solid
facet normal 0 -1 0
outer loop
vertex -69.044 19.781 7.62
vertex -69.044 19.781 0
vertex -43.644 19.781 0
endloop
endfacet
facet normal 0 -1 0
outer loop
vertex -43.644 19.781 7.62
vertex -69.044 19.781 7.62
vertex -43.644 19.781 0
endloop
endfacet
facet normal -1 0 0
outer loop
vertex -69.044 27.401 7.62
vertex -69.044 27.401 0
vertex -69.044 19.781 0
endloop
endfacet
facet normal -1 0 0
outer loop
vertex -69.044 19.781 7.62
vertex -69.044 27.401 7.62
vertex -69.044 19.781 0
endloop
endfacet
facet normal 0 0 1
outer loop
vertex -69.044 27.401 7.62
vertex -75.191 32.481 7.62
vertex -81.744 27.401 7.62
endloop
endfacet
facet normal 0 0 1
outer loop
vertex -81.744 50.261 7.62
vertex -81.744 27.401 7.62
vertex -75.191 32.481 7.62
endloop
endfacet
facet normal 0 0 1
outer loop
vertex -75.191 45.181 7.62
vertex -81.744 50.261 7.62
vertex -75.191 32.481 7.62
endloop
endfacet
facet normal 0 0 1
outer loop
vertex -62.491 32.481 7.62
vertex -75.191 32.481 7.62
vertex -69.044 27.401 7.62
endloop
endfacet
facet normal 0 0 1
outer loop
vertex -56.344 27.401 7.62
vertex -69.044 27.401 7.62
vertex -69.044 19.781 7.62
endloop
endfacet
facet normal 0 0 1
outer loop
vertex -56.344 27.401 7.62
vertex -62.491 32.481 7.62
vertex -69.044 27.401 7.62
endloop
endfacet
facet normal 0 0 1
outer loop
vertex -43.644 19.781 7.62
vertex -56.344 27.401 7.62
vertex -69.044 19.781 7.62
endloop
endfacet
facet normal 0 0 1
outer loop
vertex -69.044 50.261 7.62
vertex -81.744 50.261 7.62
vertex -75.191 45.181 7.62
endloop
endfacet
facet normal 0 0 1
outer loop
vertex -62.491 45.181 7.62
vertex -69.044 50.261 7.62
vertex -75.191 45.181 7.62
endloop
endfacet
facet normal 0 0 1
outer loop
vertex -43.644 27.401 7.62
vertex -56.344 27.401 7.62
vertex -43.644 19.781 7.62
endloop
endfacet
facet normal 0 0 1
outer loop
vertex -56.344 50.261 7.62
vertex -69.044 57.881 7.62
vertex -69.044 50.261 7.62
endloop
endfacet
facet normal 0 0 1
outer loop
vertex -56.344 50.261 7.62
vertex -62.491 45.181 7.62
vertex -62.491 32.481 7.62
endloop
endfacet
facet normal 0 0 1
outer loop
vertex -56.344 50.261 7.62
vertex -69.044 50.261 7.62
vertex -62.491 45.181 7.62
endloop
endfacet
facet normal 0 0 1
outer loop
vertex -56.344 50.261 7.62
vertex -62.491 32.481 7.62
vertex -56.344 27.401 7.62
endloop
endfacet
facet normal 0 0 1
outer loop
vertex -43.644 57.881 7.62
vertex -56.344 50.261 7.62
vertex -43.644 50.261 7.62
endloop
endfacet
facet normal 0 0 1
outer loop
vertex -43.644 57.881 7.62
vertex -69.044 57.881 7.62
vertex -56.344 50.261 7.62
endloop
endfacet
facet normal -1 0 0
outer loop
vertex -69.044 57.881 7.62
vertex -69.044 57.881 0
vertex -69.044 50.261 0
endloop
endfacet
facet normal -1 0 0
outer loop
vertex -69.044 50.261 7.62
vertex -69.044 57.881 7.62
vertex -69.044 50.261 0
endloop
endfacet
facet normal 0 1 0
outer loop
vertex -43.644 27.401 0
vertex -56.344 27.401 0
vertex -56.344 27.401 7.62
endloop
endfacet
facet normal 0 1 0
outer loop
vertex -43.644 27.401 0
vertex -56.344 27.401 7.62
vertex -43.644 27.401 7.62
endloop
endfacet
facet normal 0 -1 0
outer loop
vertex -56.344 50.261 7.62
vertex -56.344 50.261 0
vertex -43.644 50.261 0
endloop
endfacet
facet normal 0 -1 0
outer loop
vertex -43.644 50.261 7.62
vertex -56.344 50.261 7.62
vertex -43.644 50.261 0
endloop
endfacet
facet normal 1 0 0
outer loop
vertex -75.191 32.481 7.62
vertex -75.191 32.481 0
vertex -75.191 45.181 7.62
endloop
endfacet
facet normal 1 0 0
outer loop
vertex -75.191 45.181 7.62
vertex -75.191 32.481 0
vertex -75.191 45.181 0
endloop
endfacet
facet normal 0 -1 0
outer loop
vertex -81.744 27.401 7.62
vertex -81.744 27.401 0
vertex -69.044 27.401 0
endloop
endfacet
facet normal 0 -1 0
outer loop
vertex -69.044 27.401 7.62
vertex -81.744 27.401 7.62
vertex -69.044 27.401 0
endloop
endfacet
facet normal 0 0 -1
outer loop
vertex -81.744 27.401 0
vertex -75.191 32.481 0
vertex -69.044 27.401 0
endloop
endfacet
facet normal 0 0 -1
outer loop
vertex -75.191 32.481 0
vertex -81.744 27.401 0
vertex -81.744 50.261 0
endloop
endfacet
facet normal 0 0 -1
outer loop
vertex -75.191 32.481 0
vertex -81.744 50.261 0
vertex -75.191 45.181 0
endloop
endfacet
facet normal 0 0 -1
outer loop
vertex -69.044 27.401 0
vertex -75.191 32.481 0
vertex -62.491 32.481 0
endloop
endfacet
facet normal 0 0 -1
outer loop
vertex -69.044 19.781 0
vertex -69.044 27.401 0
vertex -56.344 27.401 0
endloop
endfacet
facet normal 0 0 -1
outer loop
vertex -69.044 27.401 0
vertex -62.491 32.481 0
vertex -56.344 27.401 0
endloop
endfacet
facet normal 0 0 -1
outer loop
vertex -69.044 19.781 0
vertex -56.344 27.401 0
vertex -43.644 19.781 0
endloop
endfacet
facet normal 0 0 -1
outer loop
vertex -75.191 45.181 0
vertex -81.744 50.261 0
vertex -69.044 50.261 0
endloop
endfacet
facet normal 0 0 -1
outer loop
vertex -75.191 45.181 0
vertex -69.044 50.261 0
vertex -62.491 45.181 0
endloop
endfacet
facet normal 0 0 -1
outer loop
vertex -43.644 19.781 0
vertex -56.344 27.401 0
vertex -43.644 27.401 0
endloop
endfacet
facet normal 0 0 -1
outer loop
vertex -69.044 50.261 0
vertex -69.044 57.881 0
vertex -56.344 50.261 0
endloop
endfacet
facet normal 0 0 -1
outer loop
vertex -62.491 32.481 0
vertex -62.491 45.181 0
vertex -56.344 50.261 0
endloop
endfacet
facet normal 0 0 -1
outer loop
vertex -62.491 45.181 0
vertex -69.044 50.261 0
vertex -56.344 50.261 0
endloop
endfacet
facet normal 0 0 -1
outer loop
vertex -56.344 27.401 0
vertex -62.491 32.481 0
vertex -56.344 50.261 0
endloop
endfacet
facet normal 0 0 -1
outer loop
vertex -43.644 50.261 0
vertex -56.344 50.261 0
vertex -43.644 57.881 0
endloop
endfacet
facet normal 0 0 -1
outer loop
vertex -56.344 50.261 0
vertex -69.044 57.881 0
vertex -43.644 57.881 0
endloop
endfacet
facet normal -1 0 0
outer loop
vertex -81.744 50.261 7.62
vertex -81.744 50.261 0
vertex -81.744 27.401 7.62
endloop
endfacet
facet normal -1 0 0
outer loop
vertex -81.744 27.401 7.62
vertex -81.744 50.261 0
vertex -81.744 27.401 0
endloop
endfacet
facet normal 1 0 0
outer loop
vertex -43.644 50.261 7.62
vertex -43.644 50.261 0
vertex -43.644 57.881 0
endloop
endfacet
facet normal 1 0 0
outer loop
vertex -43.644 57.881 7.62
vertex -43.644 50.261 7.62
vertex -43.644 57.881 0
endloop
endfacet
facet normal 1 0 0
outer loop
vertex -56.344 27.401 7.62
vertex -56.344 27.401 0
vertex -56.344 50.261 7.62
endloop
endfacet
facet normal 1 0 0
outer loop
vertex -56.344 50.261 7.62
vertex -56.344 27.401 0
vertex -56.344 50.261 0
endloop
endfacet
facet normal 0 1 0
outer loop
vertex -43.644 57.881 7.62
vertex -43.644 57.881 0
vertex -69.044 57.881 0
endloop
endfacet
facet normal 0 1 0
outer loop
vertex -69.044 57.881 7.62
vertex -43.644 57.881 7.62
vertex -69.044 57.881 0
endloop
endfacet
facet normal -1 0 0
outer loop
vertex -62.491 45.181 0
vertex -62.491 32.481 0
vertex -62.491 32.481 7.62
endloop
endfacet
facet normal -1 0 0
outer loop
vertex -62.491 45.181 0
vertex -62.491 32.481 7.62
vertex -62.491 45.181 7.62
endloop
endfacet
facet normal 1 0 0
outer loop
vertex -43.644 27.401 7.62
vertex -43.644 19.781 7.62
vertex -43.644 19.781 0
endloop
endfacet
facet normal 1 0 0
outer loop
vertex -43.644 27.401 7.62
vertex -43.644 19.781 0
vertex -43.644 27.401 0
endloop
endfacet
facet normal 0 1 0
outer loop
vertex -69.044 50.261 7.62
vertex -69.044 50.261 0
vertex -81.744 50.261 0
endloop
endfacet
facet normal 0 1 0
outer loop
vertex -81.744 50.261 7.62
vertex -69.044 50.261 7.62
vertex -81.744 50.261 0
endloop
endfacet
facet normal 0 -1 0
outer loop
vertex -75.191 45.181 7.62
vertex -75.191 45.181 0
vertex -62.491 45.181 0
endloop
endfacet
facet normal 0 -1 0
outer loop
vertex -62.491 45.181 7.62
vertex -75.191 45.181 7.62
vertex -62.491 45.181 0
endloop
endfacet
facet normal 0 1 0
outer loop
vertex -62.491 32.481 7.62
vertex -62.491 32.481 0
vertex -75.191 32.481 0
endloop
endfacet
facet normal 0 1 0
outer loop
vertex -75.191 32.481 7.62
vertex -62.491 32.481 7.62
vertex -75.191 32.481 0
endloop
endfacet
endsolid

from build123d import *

# Parameters (mm, degrees)
F0_W     = 12.7
F0_H     = 7.62
F0_W_2   = 6.1468
F0_H_2   = 12.7
F1_DEPTH = 7.62
F2_R     = 25.4
F3_DEPTH = 25.4
F5_DEPTH = 25.4
F6_R     = 5.08


with BuildPart() as f1:
    # F0 (on Top) → F1 (new body)
    with BuildSketch(Plane.XY):
        Polygon((-69.044474, 45.180961), (-69.044474, 50.260961), (-81.744474, 50.260961), (-81.744474, 27.400961), (-69.044474, 27.400961), (-69.044474, 32.480961), (-75.191274, 32.480961), (-75.191274, 45.180961), align=None)
        Polygon((-56.344474, 57.880961), (-69.044474, 57.880961), (-69.044474, 50.260961), (-69.044474, 45.180961), (-62.491274, 45.180961), (-56.344474, 45.180961), (-56.344474, 50.260961), align=None)
        with Locations((-49.994474, 54.070961)):
            Rectangle(F0_W, F0_H)
        with Locations((-49.994474, 23.590961)):
            Rectangle(F0_W, F0_H)
        Polygon((-56.344474, 27.400961), (-56.344474, 32.480961), (-62.491274, 32.480961), (-69.044474, 32.480961), (-69.044474, 27.400961), (-69.044474, 19.780961), (-56.344474, 19.780961), align=None)
        with Locations((-59.417874, 38.830961)):
            Rectangle(F0_W_2, F0_H_2)
    extrude(amount=F1_DEPTH)


with BuildPart() as f3:
    # F2 (on Top) → F3 (new body)
    with BuildSketch(Plane.XY):
        with Locations((41.206498, 17.812403)):
            Circle(F2_R)
    extrude(amount=F3_DEPTH)


with BuildPart() as f5:
    # F4 (on Top) → F5 (new body)
    with BuildSketch(Plane.XY):
        Polygon((42.736534, 52.771983), (27.891826, 63.671286), (25.875106, 45.36574), align=None)
    extrude(amount=F5_DEPTH)

    # F6
    f6_edges = [f5.edges().sort_by_distance(p)[0] for p in [
        (35.31418, 58.221634, 25.4),
        (26.883466, 54.518513, 25.4),
        (34.30582, 49.068861, 25.4),
        (35.31418, 58.221634, 0),
        (26.883466, 54.518513, 0),
        (34.30582, 49.068861, 0),
    ]]
    fillet(f6_edges, radius=F6_R)


solid = f1.part
